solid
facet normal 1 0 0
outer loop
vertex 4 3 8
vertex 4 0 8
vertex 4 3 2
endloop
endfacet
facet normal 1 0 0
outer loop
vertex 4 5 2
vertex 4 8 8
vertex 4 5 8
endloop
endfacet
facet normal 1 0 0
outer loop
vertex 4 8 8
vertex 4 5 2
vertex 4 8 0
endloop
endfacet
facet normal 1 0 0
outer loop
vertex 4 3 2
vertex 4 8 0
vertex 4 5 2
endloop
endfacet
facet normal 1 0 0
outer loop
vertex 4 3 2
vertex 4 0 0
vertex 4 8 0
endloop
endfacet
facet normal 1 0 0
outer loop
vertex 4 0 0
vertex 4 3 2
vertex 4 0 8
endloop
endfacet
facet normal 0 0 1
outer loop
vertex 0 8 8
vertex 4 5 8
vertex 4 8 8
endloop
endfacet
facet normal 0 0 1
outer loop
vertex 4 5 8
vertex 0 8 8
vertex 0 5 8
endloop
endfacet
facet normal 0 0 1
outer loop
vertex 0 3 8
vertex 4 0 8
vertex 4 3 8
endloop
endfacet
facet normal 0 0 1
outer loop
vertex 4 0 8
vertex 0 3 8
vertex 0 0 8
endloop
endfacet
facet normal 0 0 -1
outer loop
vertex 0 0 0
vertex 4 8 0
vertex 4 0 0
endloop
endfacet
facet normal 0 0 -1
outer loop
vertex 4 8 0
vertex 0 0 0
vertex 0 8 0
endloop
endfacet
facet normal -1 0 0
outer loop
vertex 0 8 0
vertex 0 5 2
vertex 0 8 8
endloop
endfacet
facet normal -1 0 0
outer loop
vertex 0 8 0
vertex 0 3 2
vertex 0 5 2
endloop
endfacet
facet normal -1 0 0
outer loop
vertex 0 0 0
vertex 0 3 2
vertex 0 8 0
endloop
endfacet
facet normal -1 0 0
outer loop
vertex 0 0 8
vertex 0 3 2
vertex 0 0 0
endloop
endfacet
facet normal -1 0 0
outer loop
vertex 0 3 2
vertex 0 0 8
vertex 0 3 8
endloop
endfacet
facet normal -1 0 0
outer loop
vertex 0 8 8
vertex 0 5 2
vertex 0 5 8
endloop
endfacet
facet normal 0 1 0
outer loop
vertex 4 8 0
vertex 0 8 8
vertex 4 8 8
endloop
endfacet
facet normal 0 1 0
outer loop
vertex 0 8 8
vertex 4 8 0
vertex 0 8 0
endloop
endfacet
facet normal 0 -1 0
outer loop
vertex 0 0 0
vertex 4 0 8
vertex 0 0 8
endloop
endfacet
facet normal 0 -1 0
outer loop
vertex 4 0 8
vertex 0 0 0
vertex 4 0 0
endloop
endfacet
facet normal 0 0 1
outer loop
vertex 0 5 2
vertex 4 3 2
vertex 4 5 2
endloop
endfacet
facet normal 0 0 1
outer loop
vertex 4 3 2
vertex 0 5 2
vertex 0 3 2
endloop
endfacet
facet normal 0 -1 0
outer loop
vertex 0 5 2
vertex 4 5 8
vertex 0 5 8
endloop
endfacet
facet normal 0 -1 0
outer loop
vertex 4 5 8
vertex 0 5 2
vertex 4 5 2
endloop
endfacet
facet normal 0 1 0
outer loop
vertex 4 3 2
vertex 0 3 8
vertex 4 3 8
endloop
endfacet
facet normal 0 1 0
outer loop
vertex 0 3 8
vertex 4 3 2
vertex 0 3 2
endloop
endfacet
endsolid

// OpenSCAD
difference(){//overall size
translate([0,0,0])cube ([4,8,8]);
translate([-1,3,2])cube([10,2,9]);
}
